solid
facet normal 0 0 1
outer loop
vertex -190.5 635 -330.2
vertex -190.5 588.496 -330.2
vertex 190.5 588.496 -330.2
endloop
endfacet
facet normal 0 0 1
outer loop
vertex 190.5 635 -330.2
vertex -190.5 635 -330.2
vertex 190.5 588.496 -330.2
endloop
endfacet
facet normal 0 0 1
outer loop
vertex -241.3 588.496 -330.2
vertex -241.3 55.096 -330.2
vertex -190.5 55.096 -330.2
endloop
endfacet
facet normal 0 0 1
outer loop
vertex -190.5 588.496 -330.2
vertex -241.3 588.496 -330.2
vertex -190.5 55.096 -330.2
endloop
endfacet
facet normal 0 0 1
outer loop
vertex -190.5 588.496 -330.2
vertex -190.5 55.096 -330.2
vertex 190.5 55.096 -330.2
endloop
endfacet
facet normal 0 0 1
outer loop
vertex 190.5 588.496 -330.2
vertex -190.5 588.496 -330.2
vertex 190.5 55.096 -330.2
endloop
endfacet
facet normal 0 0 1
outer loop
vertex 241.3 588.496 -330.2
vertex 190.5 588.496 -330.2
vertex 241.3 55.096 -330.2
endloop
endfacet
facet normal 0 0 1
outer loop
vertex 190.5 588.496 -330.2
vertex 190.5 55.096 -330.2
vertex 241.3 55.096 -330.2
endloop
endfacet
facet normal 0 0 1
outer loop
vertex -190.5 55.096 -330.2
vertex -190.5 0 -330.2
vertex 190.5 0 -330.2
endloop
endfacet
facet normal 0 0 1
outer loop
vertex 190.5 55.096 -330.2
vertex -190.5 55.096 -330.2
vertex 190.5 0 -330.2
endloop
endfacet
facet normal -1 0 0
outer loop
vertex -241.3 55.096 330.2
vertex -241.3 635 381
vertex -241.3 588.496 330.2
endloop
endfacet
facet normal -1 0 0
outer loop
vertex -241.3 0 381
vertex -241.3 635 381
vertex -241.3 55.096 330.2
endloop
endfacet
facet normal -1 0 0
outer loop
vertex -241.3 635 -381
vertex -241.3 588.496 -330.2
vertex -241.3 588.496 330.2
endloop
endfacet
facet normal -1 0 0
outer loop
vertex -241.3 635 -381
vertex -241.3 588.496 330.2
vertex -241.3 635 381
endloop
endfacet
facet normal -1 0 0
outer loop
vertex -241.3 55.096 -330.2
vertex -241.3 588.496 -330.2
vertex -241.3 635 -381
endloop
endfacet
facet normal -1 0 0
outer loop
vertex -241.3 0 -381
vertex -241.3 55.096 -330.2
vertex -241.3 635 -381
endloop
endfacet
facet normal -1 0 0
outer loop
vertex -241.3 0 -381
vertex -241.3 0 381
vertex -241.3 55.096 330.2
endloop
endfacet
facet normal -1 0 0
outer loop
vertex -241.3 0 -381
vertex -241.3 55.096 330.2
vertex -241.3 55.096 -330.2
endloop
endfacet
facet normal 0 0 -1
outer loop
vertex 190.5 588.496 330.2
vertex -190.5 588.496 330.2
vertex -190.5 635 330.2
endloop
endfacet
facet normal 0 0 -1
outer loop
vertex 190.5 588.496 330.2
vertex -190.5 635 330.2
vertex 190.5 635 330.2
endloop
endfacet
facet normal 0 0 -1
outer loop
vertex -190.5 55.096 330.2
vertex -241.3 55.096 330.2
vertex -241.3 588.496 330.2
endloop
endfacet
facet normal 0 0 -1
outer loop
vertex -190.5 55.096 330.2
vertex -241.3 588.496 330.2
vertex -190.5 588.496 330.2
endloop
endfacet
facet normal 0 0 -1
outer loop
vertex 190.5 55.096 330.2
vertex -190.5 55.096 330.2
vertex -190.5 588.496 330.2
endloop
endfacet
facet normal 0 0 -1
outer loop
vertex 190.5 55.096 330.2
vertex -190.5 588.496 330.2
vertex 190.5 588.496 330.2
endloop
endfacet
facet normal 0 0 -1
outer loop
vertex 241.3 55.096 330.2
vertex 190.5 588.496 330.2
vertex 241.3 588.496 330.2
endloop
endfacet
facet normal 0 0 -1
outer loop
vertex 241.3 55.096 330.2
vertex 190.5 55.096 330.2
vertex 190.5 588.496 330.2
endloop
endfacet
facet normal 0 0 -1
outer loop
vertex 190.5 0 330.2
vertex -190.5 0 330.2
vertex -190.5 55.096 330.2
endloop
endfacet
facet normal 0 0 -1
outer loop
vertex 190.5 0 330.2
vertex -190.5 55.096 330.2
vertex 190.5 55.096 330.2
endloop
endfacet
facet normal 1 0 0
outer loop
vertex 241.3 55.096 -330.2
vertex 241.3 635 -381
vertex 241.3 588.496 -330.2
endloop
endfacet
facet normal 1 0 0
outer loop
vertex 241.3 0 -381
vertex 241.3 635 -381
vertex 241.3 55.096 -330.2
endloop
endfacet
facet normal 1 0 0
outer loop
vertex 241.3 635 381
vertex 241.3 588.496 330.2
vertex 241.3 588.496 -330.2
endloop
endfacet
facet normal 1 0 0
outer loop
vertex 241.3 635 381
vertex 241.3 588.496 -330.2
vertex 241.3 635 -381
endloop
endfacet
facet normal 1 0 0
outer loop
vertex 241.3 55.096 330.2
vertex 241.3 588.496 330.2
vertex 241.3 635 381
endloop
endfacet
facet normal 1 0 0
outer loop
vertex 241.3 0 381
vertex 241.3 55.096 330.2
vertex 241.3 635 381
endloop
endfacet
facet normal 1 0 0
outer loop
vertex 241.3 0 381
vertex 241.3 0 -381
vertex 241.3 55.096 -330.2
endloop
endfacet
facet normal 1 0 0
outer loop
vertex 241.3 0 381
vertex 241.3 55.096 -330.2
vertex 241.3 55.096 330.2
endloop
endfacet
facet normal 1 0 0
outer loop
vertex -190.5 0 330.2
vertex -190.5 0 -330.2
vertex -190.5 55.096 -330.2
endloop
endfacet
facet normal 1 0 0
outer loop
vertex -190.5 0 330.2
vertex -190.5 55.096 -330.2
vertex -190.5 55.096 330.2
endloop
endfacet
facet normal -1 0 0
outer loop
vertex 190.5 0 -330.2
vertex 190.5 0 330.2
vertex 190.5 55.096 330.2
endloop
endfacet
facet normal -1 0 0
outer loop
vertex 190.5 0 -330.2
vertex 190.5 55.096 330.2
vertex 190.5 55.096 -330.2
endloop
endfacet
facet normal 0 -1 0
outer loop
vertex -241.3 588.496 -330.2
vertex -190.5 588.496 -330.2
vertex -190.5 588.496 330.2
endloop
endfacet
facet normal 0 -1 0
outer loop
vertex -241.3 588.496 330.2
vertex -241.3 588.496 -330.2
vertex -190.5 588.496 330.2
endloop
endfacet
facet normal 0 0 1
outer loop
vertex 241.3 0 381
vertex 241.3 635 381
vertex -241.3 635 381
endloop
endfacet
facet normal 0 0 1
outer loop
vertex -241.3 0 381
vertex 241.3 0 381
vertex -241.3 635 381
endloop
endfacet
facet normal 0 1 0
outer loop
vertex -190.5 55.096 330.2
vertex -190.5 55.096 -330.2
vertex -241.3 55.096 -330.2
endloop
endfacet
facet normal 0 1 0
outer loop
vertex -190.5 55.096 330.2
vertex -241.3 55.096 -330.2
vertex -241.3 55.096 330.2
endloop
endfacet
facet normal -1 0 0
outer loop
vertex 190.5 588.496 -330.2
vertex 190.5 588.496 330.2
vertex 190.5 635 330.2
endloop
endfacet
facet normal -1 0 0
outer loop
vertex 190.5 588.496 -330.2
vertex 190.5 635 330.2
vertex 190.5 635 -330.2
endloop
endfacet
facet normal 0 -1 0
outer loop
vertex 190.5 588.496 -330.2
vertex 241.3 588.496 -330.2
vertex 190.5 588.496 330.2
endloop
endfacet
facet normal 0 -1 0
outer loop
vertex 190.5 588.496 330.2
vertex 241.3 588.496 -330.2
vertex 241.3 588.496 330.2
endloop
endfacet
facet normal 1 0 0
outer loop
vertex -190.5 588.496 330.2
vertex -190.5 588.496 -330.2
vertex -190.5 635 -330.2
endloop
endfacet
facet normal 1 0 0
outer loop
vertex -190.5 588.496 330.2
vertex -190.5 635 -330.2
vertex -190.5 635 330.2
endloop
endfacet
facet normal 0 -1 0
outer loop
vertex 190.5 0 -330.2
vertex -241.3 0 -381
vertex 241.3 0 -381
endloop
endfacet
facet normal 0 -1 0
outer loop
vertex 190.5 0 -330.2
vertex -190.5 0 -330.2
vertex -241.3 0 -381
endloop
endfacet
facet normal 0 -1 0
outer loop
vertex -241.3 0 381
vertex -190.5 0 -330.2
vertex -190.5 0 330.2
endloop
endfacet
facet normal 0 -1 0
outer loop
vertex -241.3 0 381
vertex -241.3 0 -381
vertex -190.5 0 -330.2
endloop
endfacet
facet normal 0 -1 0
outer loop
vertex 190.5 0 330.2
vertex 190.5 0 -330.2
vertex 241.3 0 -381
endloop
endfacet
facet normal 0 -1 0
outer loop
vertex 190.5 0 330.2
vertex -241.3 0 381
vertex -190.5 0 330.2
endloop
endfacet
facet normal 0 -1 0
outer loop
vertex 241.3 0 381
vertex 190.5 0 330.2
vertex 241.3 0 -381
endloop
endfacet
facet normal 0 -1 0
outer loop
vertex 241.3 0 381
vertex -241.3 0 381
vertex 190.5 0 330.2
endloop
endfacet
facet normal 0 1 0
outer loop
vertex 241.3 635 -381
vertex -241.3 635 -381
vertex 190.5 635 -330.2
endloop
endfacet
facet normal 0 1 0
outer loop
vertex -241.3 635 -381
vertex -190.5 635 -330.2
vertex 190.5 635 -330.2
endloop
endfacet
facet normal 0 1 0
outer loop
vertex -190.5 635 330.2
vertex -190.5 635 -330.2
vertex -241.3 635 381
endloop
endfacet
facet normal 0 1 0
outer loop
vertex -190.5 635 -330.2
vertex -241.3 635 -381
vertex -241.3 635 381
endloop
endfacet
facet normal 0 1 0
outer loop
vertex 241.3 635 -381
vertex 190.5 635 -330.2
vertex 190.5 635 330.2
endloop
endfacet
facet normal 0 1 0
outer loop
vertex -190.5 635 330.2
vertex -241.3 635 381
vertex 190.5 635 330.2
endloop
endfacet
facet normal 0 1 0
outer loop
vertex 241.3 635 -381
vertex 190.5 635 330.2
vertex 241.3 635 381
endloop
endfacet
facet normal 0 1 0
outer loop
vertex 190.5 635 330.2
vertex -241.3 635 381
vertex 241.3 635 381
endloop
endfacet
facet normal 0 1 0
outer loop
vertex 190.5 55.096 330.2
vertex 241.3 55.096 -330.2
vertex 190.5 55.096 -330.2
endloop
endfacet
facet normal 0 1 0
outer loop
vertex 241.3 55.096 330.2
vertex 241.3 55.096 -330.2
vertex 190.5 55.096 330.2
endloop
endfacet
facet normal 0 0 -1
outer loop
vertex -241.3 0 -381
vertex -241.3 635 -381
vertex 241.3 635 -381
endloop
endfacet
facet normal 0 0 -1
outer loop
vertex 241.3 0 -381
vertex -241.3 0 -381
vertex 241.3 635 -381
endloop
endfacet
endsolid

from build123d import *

# Parameters (mm, degrees)
F0_W     = 381
F0_H     = 50.8
F1_DEPTH = 635
F2_W     = 533.4
F2_H     = 660.4
F3_DEPTH = 482.601
F0_H_2   = 660.4
F4_DEPTH = 635.001


# Not quite as in the source:
# - a feature names something its author has since deleted; it is built from what else it names


with BuildPart() as f1:
    # F0 (on Front) → F1 (new body)
    with BuildSketch(Plane.XZ):
        with Locations((0, 355.6)):
            Rectangle(F0_W, F0_H)
        Polygon((241.3, 381), (190.5, 381), (190.5, 330.2), (190.5, -330.2), (190.5, -381), (241.3, -381), align=None)
        with Locations((0, -355.6)):
            Rectangle(F0_W, F0_H)
        Polygon((-190.5, 381), (-241.3, 381), (-241.3, -381), (-190.5, -381), (-190.5, -330.2), (-190.5, 330.2), align=None)
    extrude(amount=-F1_DEPTH)

    # F2 (on face) → F3 (cut, through all)
    with BuildSketch(Plane.YZ.offset(241.3)):
        with Locations((321.7956796288, 0)):
            Rectangle(F2_W, F2_H)
    extrude(amount=-F3_DEPTH, mode=Mode.SUBTRACT)

    # F0 (on Front) → F4 (cut, through all)
    with BuildSketch(Plane.XZ):
        Rectangle(F0_W, F0_H_2)
    extrude(amount=-F4_DEPTH, mode=Mode.SUBTRACT)


solid = f1.part
